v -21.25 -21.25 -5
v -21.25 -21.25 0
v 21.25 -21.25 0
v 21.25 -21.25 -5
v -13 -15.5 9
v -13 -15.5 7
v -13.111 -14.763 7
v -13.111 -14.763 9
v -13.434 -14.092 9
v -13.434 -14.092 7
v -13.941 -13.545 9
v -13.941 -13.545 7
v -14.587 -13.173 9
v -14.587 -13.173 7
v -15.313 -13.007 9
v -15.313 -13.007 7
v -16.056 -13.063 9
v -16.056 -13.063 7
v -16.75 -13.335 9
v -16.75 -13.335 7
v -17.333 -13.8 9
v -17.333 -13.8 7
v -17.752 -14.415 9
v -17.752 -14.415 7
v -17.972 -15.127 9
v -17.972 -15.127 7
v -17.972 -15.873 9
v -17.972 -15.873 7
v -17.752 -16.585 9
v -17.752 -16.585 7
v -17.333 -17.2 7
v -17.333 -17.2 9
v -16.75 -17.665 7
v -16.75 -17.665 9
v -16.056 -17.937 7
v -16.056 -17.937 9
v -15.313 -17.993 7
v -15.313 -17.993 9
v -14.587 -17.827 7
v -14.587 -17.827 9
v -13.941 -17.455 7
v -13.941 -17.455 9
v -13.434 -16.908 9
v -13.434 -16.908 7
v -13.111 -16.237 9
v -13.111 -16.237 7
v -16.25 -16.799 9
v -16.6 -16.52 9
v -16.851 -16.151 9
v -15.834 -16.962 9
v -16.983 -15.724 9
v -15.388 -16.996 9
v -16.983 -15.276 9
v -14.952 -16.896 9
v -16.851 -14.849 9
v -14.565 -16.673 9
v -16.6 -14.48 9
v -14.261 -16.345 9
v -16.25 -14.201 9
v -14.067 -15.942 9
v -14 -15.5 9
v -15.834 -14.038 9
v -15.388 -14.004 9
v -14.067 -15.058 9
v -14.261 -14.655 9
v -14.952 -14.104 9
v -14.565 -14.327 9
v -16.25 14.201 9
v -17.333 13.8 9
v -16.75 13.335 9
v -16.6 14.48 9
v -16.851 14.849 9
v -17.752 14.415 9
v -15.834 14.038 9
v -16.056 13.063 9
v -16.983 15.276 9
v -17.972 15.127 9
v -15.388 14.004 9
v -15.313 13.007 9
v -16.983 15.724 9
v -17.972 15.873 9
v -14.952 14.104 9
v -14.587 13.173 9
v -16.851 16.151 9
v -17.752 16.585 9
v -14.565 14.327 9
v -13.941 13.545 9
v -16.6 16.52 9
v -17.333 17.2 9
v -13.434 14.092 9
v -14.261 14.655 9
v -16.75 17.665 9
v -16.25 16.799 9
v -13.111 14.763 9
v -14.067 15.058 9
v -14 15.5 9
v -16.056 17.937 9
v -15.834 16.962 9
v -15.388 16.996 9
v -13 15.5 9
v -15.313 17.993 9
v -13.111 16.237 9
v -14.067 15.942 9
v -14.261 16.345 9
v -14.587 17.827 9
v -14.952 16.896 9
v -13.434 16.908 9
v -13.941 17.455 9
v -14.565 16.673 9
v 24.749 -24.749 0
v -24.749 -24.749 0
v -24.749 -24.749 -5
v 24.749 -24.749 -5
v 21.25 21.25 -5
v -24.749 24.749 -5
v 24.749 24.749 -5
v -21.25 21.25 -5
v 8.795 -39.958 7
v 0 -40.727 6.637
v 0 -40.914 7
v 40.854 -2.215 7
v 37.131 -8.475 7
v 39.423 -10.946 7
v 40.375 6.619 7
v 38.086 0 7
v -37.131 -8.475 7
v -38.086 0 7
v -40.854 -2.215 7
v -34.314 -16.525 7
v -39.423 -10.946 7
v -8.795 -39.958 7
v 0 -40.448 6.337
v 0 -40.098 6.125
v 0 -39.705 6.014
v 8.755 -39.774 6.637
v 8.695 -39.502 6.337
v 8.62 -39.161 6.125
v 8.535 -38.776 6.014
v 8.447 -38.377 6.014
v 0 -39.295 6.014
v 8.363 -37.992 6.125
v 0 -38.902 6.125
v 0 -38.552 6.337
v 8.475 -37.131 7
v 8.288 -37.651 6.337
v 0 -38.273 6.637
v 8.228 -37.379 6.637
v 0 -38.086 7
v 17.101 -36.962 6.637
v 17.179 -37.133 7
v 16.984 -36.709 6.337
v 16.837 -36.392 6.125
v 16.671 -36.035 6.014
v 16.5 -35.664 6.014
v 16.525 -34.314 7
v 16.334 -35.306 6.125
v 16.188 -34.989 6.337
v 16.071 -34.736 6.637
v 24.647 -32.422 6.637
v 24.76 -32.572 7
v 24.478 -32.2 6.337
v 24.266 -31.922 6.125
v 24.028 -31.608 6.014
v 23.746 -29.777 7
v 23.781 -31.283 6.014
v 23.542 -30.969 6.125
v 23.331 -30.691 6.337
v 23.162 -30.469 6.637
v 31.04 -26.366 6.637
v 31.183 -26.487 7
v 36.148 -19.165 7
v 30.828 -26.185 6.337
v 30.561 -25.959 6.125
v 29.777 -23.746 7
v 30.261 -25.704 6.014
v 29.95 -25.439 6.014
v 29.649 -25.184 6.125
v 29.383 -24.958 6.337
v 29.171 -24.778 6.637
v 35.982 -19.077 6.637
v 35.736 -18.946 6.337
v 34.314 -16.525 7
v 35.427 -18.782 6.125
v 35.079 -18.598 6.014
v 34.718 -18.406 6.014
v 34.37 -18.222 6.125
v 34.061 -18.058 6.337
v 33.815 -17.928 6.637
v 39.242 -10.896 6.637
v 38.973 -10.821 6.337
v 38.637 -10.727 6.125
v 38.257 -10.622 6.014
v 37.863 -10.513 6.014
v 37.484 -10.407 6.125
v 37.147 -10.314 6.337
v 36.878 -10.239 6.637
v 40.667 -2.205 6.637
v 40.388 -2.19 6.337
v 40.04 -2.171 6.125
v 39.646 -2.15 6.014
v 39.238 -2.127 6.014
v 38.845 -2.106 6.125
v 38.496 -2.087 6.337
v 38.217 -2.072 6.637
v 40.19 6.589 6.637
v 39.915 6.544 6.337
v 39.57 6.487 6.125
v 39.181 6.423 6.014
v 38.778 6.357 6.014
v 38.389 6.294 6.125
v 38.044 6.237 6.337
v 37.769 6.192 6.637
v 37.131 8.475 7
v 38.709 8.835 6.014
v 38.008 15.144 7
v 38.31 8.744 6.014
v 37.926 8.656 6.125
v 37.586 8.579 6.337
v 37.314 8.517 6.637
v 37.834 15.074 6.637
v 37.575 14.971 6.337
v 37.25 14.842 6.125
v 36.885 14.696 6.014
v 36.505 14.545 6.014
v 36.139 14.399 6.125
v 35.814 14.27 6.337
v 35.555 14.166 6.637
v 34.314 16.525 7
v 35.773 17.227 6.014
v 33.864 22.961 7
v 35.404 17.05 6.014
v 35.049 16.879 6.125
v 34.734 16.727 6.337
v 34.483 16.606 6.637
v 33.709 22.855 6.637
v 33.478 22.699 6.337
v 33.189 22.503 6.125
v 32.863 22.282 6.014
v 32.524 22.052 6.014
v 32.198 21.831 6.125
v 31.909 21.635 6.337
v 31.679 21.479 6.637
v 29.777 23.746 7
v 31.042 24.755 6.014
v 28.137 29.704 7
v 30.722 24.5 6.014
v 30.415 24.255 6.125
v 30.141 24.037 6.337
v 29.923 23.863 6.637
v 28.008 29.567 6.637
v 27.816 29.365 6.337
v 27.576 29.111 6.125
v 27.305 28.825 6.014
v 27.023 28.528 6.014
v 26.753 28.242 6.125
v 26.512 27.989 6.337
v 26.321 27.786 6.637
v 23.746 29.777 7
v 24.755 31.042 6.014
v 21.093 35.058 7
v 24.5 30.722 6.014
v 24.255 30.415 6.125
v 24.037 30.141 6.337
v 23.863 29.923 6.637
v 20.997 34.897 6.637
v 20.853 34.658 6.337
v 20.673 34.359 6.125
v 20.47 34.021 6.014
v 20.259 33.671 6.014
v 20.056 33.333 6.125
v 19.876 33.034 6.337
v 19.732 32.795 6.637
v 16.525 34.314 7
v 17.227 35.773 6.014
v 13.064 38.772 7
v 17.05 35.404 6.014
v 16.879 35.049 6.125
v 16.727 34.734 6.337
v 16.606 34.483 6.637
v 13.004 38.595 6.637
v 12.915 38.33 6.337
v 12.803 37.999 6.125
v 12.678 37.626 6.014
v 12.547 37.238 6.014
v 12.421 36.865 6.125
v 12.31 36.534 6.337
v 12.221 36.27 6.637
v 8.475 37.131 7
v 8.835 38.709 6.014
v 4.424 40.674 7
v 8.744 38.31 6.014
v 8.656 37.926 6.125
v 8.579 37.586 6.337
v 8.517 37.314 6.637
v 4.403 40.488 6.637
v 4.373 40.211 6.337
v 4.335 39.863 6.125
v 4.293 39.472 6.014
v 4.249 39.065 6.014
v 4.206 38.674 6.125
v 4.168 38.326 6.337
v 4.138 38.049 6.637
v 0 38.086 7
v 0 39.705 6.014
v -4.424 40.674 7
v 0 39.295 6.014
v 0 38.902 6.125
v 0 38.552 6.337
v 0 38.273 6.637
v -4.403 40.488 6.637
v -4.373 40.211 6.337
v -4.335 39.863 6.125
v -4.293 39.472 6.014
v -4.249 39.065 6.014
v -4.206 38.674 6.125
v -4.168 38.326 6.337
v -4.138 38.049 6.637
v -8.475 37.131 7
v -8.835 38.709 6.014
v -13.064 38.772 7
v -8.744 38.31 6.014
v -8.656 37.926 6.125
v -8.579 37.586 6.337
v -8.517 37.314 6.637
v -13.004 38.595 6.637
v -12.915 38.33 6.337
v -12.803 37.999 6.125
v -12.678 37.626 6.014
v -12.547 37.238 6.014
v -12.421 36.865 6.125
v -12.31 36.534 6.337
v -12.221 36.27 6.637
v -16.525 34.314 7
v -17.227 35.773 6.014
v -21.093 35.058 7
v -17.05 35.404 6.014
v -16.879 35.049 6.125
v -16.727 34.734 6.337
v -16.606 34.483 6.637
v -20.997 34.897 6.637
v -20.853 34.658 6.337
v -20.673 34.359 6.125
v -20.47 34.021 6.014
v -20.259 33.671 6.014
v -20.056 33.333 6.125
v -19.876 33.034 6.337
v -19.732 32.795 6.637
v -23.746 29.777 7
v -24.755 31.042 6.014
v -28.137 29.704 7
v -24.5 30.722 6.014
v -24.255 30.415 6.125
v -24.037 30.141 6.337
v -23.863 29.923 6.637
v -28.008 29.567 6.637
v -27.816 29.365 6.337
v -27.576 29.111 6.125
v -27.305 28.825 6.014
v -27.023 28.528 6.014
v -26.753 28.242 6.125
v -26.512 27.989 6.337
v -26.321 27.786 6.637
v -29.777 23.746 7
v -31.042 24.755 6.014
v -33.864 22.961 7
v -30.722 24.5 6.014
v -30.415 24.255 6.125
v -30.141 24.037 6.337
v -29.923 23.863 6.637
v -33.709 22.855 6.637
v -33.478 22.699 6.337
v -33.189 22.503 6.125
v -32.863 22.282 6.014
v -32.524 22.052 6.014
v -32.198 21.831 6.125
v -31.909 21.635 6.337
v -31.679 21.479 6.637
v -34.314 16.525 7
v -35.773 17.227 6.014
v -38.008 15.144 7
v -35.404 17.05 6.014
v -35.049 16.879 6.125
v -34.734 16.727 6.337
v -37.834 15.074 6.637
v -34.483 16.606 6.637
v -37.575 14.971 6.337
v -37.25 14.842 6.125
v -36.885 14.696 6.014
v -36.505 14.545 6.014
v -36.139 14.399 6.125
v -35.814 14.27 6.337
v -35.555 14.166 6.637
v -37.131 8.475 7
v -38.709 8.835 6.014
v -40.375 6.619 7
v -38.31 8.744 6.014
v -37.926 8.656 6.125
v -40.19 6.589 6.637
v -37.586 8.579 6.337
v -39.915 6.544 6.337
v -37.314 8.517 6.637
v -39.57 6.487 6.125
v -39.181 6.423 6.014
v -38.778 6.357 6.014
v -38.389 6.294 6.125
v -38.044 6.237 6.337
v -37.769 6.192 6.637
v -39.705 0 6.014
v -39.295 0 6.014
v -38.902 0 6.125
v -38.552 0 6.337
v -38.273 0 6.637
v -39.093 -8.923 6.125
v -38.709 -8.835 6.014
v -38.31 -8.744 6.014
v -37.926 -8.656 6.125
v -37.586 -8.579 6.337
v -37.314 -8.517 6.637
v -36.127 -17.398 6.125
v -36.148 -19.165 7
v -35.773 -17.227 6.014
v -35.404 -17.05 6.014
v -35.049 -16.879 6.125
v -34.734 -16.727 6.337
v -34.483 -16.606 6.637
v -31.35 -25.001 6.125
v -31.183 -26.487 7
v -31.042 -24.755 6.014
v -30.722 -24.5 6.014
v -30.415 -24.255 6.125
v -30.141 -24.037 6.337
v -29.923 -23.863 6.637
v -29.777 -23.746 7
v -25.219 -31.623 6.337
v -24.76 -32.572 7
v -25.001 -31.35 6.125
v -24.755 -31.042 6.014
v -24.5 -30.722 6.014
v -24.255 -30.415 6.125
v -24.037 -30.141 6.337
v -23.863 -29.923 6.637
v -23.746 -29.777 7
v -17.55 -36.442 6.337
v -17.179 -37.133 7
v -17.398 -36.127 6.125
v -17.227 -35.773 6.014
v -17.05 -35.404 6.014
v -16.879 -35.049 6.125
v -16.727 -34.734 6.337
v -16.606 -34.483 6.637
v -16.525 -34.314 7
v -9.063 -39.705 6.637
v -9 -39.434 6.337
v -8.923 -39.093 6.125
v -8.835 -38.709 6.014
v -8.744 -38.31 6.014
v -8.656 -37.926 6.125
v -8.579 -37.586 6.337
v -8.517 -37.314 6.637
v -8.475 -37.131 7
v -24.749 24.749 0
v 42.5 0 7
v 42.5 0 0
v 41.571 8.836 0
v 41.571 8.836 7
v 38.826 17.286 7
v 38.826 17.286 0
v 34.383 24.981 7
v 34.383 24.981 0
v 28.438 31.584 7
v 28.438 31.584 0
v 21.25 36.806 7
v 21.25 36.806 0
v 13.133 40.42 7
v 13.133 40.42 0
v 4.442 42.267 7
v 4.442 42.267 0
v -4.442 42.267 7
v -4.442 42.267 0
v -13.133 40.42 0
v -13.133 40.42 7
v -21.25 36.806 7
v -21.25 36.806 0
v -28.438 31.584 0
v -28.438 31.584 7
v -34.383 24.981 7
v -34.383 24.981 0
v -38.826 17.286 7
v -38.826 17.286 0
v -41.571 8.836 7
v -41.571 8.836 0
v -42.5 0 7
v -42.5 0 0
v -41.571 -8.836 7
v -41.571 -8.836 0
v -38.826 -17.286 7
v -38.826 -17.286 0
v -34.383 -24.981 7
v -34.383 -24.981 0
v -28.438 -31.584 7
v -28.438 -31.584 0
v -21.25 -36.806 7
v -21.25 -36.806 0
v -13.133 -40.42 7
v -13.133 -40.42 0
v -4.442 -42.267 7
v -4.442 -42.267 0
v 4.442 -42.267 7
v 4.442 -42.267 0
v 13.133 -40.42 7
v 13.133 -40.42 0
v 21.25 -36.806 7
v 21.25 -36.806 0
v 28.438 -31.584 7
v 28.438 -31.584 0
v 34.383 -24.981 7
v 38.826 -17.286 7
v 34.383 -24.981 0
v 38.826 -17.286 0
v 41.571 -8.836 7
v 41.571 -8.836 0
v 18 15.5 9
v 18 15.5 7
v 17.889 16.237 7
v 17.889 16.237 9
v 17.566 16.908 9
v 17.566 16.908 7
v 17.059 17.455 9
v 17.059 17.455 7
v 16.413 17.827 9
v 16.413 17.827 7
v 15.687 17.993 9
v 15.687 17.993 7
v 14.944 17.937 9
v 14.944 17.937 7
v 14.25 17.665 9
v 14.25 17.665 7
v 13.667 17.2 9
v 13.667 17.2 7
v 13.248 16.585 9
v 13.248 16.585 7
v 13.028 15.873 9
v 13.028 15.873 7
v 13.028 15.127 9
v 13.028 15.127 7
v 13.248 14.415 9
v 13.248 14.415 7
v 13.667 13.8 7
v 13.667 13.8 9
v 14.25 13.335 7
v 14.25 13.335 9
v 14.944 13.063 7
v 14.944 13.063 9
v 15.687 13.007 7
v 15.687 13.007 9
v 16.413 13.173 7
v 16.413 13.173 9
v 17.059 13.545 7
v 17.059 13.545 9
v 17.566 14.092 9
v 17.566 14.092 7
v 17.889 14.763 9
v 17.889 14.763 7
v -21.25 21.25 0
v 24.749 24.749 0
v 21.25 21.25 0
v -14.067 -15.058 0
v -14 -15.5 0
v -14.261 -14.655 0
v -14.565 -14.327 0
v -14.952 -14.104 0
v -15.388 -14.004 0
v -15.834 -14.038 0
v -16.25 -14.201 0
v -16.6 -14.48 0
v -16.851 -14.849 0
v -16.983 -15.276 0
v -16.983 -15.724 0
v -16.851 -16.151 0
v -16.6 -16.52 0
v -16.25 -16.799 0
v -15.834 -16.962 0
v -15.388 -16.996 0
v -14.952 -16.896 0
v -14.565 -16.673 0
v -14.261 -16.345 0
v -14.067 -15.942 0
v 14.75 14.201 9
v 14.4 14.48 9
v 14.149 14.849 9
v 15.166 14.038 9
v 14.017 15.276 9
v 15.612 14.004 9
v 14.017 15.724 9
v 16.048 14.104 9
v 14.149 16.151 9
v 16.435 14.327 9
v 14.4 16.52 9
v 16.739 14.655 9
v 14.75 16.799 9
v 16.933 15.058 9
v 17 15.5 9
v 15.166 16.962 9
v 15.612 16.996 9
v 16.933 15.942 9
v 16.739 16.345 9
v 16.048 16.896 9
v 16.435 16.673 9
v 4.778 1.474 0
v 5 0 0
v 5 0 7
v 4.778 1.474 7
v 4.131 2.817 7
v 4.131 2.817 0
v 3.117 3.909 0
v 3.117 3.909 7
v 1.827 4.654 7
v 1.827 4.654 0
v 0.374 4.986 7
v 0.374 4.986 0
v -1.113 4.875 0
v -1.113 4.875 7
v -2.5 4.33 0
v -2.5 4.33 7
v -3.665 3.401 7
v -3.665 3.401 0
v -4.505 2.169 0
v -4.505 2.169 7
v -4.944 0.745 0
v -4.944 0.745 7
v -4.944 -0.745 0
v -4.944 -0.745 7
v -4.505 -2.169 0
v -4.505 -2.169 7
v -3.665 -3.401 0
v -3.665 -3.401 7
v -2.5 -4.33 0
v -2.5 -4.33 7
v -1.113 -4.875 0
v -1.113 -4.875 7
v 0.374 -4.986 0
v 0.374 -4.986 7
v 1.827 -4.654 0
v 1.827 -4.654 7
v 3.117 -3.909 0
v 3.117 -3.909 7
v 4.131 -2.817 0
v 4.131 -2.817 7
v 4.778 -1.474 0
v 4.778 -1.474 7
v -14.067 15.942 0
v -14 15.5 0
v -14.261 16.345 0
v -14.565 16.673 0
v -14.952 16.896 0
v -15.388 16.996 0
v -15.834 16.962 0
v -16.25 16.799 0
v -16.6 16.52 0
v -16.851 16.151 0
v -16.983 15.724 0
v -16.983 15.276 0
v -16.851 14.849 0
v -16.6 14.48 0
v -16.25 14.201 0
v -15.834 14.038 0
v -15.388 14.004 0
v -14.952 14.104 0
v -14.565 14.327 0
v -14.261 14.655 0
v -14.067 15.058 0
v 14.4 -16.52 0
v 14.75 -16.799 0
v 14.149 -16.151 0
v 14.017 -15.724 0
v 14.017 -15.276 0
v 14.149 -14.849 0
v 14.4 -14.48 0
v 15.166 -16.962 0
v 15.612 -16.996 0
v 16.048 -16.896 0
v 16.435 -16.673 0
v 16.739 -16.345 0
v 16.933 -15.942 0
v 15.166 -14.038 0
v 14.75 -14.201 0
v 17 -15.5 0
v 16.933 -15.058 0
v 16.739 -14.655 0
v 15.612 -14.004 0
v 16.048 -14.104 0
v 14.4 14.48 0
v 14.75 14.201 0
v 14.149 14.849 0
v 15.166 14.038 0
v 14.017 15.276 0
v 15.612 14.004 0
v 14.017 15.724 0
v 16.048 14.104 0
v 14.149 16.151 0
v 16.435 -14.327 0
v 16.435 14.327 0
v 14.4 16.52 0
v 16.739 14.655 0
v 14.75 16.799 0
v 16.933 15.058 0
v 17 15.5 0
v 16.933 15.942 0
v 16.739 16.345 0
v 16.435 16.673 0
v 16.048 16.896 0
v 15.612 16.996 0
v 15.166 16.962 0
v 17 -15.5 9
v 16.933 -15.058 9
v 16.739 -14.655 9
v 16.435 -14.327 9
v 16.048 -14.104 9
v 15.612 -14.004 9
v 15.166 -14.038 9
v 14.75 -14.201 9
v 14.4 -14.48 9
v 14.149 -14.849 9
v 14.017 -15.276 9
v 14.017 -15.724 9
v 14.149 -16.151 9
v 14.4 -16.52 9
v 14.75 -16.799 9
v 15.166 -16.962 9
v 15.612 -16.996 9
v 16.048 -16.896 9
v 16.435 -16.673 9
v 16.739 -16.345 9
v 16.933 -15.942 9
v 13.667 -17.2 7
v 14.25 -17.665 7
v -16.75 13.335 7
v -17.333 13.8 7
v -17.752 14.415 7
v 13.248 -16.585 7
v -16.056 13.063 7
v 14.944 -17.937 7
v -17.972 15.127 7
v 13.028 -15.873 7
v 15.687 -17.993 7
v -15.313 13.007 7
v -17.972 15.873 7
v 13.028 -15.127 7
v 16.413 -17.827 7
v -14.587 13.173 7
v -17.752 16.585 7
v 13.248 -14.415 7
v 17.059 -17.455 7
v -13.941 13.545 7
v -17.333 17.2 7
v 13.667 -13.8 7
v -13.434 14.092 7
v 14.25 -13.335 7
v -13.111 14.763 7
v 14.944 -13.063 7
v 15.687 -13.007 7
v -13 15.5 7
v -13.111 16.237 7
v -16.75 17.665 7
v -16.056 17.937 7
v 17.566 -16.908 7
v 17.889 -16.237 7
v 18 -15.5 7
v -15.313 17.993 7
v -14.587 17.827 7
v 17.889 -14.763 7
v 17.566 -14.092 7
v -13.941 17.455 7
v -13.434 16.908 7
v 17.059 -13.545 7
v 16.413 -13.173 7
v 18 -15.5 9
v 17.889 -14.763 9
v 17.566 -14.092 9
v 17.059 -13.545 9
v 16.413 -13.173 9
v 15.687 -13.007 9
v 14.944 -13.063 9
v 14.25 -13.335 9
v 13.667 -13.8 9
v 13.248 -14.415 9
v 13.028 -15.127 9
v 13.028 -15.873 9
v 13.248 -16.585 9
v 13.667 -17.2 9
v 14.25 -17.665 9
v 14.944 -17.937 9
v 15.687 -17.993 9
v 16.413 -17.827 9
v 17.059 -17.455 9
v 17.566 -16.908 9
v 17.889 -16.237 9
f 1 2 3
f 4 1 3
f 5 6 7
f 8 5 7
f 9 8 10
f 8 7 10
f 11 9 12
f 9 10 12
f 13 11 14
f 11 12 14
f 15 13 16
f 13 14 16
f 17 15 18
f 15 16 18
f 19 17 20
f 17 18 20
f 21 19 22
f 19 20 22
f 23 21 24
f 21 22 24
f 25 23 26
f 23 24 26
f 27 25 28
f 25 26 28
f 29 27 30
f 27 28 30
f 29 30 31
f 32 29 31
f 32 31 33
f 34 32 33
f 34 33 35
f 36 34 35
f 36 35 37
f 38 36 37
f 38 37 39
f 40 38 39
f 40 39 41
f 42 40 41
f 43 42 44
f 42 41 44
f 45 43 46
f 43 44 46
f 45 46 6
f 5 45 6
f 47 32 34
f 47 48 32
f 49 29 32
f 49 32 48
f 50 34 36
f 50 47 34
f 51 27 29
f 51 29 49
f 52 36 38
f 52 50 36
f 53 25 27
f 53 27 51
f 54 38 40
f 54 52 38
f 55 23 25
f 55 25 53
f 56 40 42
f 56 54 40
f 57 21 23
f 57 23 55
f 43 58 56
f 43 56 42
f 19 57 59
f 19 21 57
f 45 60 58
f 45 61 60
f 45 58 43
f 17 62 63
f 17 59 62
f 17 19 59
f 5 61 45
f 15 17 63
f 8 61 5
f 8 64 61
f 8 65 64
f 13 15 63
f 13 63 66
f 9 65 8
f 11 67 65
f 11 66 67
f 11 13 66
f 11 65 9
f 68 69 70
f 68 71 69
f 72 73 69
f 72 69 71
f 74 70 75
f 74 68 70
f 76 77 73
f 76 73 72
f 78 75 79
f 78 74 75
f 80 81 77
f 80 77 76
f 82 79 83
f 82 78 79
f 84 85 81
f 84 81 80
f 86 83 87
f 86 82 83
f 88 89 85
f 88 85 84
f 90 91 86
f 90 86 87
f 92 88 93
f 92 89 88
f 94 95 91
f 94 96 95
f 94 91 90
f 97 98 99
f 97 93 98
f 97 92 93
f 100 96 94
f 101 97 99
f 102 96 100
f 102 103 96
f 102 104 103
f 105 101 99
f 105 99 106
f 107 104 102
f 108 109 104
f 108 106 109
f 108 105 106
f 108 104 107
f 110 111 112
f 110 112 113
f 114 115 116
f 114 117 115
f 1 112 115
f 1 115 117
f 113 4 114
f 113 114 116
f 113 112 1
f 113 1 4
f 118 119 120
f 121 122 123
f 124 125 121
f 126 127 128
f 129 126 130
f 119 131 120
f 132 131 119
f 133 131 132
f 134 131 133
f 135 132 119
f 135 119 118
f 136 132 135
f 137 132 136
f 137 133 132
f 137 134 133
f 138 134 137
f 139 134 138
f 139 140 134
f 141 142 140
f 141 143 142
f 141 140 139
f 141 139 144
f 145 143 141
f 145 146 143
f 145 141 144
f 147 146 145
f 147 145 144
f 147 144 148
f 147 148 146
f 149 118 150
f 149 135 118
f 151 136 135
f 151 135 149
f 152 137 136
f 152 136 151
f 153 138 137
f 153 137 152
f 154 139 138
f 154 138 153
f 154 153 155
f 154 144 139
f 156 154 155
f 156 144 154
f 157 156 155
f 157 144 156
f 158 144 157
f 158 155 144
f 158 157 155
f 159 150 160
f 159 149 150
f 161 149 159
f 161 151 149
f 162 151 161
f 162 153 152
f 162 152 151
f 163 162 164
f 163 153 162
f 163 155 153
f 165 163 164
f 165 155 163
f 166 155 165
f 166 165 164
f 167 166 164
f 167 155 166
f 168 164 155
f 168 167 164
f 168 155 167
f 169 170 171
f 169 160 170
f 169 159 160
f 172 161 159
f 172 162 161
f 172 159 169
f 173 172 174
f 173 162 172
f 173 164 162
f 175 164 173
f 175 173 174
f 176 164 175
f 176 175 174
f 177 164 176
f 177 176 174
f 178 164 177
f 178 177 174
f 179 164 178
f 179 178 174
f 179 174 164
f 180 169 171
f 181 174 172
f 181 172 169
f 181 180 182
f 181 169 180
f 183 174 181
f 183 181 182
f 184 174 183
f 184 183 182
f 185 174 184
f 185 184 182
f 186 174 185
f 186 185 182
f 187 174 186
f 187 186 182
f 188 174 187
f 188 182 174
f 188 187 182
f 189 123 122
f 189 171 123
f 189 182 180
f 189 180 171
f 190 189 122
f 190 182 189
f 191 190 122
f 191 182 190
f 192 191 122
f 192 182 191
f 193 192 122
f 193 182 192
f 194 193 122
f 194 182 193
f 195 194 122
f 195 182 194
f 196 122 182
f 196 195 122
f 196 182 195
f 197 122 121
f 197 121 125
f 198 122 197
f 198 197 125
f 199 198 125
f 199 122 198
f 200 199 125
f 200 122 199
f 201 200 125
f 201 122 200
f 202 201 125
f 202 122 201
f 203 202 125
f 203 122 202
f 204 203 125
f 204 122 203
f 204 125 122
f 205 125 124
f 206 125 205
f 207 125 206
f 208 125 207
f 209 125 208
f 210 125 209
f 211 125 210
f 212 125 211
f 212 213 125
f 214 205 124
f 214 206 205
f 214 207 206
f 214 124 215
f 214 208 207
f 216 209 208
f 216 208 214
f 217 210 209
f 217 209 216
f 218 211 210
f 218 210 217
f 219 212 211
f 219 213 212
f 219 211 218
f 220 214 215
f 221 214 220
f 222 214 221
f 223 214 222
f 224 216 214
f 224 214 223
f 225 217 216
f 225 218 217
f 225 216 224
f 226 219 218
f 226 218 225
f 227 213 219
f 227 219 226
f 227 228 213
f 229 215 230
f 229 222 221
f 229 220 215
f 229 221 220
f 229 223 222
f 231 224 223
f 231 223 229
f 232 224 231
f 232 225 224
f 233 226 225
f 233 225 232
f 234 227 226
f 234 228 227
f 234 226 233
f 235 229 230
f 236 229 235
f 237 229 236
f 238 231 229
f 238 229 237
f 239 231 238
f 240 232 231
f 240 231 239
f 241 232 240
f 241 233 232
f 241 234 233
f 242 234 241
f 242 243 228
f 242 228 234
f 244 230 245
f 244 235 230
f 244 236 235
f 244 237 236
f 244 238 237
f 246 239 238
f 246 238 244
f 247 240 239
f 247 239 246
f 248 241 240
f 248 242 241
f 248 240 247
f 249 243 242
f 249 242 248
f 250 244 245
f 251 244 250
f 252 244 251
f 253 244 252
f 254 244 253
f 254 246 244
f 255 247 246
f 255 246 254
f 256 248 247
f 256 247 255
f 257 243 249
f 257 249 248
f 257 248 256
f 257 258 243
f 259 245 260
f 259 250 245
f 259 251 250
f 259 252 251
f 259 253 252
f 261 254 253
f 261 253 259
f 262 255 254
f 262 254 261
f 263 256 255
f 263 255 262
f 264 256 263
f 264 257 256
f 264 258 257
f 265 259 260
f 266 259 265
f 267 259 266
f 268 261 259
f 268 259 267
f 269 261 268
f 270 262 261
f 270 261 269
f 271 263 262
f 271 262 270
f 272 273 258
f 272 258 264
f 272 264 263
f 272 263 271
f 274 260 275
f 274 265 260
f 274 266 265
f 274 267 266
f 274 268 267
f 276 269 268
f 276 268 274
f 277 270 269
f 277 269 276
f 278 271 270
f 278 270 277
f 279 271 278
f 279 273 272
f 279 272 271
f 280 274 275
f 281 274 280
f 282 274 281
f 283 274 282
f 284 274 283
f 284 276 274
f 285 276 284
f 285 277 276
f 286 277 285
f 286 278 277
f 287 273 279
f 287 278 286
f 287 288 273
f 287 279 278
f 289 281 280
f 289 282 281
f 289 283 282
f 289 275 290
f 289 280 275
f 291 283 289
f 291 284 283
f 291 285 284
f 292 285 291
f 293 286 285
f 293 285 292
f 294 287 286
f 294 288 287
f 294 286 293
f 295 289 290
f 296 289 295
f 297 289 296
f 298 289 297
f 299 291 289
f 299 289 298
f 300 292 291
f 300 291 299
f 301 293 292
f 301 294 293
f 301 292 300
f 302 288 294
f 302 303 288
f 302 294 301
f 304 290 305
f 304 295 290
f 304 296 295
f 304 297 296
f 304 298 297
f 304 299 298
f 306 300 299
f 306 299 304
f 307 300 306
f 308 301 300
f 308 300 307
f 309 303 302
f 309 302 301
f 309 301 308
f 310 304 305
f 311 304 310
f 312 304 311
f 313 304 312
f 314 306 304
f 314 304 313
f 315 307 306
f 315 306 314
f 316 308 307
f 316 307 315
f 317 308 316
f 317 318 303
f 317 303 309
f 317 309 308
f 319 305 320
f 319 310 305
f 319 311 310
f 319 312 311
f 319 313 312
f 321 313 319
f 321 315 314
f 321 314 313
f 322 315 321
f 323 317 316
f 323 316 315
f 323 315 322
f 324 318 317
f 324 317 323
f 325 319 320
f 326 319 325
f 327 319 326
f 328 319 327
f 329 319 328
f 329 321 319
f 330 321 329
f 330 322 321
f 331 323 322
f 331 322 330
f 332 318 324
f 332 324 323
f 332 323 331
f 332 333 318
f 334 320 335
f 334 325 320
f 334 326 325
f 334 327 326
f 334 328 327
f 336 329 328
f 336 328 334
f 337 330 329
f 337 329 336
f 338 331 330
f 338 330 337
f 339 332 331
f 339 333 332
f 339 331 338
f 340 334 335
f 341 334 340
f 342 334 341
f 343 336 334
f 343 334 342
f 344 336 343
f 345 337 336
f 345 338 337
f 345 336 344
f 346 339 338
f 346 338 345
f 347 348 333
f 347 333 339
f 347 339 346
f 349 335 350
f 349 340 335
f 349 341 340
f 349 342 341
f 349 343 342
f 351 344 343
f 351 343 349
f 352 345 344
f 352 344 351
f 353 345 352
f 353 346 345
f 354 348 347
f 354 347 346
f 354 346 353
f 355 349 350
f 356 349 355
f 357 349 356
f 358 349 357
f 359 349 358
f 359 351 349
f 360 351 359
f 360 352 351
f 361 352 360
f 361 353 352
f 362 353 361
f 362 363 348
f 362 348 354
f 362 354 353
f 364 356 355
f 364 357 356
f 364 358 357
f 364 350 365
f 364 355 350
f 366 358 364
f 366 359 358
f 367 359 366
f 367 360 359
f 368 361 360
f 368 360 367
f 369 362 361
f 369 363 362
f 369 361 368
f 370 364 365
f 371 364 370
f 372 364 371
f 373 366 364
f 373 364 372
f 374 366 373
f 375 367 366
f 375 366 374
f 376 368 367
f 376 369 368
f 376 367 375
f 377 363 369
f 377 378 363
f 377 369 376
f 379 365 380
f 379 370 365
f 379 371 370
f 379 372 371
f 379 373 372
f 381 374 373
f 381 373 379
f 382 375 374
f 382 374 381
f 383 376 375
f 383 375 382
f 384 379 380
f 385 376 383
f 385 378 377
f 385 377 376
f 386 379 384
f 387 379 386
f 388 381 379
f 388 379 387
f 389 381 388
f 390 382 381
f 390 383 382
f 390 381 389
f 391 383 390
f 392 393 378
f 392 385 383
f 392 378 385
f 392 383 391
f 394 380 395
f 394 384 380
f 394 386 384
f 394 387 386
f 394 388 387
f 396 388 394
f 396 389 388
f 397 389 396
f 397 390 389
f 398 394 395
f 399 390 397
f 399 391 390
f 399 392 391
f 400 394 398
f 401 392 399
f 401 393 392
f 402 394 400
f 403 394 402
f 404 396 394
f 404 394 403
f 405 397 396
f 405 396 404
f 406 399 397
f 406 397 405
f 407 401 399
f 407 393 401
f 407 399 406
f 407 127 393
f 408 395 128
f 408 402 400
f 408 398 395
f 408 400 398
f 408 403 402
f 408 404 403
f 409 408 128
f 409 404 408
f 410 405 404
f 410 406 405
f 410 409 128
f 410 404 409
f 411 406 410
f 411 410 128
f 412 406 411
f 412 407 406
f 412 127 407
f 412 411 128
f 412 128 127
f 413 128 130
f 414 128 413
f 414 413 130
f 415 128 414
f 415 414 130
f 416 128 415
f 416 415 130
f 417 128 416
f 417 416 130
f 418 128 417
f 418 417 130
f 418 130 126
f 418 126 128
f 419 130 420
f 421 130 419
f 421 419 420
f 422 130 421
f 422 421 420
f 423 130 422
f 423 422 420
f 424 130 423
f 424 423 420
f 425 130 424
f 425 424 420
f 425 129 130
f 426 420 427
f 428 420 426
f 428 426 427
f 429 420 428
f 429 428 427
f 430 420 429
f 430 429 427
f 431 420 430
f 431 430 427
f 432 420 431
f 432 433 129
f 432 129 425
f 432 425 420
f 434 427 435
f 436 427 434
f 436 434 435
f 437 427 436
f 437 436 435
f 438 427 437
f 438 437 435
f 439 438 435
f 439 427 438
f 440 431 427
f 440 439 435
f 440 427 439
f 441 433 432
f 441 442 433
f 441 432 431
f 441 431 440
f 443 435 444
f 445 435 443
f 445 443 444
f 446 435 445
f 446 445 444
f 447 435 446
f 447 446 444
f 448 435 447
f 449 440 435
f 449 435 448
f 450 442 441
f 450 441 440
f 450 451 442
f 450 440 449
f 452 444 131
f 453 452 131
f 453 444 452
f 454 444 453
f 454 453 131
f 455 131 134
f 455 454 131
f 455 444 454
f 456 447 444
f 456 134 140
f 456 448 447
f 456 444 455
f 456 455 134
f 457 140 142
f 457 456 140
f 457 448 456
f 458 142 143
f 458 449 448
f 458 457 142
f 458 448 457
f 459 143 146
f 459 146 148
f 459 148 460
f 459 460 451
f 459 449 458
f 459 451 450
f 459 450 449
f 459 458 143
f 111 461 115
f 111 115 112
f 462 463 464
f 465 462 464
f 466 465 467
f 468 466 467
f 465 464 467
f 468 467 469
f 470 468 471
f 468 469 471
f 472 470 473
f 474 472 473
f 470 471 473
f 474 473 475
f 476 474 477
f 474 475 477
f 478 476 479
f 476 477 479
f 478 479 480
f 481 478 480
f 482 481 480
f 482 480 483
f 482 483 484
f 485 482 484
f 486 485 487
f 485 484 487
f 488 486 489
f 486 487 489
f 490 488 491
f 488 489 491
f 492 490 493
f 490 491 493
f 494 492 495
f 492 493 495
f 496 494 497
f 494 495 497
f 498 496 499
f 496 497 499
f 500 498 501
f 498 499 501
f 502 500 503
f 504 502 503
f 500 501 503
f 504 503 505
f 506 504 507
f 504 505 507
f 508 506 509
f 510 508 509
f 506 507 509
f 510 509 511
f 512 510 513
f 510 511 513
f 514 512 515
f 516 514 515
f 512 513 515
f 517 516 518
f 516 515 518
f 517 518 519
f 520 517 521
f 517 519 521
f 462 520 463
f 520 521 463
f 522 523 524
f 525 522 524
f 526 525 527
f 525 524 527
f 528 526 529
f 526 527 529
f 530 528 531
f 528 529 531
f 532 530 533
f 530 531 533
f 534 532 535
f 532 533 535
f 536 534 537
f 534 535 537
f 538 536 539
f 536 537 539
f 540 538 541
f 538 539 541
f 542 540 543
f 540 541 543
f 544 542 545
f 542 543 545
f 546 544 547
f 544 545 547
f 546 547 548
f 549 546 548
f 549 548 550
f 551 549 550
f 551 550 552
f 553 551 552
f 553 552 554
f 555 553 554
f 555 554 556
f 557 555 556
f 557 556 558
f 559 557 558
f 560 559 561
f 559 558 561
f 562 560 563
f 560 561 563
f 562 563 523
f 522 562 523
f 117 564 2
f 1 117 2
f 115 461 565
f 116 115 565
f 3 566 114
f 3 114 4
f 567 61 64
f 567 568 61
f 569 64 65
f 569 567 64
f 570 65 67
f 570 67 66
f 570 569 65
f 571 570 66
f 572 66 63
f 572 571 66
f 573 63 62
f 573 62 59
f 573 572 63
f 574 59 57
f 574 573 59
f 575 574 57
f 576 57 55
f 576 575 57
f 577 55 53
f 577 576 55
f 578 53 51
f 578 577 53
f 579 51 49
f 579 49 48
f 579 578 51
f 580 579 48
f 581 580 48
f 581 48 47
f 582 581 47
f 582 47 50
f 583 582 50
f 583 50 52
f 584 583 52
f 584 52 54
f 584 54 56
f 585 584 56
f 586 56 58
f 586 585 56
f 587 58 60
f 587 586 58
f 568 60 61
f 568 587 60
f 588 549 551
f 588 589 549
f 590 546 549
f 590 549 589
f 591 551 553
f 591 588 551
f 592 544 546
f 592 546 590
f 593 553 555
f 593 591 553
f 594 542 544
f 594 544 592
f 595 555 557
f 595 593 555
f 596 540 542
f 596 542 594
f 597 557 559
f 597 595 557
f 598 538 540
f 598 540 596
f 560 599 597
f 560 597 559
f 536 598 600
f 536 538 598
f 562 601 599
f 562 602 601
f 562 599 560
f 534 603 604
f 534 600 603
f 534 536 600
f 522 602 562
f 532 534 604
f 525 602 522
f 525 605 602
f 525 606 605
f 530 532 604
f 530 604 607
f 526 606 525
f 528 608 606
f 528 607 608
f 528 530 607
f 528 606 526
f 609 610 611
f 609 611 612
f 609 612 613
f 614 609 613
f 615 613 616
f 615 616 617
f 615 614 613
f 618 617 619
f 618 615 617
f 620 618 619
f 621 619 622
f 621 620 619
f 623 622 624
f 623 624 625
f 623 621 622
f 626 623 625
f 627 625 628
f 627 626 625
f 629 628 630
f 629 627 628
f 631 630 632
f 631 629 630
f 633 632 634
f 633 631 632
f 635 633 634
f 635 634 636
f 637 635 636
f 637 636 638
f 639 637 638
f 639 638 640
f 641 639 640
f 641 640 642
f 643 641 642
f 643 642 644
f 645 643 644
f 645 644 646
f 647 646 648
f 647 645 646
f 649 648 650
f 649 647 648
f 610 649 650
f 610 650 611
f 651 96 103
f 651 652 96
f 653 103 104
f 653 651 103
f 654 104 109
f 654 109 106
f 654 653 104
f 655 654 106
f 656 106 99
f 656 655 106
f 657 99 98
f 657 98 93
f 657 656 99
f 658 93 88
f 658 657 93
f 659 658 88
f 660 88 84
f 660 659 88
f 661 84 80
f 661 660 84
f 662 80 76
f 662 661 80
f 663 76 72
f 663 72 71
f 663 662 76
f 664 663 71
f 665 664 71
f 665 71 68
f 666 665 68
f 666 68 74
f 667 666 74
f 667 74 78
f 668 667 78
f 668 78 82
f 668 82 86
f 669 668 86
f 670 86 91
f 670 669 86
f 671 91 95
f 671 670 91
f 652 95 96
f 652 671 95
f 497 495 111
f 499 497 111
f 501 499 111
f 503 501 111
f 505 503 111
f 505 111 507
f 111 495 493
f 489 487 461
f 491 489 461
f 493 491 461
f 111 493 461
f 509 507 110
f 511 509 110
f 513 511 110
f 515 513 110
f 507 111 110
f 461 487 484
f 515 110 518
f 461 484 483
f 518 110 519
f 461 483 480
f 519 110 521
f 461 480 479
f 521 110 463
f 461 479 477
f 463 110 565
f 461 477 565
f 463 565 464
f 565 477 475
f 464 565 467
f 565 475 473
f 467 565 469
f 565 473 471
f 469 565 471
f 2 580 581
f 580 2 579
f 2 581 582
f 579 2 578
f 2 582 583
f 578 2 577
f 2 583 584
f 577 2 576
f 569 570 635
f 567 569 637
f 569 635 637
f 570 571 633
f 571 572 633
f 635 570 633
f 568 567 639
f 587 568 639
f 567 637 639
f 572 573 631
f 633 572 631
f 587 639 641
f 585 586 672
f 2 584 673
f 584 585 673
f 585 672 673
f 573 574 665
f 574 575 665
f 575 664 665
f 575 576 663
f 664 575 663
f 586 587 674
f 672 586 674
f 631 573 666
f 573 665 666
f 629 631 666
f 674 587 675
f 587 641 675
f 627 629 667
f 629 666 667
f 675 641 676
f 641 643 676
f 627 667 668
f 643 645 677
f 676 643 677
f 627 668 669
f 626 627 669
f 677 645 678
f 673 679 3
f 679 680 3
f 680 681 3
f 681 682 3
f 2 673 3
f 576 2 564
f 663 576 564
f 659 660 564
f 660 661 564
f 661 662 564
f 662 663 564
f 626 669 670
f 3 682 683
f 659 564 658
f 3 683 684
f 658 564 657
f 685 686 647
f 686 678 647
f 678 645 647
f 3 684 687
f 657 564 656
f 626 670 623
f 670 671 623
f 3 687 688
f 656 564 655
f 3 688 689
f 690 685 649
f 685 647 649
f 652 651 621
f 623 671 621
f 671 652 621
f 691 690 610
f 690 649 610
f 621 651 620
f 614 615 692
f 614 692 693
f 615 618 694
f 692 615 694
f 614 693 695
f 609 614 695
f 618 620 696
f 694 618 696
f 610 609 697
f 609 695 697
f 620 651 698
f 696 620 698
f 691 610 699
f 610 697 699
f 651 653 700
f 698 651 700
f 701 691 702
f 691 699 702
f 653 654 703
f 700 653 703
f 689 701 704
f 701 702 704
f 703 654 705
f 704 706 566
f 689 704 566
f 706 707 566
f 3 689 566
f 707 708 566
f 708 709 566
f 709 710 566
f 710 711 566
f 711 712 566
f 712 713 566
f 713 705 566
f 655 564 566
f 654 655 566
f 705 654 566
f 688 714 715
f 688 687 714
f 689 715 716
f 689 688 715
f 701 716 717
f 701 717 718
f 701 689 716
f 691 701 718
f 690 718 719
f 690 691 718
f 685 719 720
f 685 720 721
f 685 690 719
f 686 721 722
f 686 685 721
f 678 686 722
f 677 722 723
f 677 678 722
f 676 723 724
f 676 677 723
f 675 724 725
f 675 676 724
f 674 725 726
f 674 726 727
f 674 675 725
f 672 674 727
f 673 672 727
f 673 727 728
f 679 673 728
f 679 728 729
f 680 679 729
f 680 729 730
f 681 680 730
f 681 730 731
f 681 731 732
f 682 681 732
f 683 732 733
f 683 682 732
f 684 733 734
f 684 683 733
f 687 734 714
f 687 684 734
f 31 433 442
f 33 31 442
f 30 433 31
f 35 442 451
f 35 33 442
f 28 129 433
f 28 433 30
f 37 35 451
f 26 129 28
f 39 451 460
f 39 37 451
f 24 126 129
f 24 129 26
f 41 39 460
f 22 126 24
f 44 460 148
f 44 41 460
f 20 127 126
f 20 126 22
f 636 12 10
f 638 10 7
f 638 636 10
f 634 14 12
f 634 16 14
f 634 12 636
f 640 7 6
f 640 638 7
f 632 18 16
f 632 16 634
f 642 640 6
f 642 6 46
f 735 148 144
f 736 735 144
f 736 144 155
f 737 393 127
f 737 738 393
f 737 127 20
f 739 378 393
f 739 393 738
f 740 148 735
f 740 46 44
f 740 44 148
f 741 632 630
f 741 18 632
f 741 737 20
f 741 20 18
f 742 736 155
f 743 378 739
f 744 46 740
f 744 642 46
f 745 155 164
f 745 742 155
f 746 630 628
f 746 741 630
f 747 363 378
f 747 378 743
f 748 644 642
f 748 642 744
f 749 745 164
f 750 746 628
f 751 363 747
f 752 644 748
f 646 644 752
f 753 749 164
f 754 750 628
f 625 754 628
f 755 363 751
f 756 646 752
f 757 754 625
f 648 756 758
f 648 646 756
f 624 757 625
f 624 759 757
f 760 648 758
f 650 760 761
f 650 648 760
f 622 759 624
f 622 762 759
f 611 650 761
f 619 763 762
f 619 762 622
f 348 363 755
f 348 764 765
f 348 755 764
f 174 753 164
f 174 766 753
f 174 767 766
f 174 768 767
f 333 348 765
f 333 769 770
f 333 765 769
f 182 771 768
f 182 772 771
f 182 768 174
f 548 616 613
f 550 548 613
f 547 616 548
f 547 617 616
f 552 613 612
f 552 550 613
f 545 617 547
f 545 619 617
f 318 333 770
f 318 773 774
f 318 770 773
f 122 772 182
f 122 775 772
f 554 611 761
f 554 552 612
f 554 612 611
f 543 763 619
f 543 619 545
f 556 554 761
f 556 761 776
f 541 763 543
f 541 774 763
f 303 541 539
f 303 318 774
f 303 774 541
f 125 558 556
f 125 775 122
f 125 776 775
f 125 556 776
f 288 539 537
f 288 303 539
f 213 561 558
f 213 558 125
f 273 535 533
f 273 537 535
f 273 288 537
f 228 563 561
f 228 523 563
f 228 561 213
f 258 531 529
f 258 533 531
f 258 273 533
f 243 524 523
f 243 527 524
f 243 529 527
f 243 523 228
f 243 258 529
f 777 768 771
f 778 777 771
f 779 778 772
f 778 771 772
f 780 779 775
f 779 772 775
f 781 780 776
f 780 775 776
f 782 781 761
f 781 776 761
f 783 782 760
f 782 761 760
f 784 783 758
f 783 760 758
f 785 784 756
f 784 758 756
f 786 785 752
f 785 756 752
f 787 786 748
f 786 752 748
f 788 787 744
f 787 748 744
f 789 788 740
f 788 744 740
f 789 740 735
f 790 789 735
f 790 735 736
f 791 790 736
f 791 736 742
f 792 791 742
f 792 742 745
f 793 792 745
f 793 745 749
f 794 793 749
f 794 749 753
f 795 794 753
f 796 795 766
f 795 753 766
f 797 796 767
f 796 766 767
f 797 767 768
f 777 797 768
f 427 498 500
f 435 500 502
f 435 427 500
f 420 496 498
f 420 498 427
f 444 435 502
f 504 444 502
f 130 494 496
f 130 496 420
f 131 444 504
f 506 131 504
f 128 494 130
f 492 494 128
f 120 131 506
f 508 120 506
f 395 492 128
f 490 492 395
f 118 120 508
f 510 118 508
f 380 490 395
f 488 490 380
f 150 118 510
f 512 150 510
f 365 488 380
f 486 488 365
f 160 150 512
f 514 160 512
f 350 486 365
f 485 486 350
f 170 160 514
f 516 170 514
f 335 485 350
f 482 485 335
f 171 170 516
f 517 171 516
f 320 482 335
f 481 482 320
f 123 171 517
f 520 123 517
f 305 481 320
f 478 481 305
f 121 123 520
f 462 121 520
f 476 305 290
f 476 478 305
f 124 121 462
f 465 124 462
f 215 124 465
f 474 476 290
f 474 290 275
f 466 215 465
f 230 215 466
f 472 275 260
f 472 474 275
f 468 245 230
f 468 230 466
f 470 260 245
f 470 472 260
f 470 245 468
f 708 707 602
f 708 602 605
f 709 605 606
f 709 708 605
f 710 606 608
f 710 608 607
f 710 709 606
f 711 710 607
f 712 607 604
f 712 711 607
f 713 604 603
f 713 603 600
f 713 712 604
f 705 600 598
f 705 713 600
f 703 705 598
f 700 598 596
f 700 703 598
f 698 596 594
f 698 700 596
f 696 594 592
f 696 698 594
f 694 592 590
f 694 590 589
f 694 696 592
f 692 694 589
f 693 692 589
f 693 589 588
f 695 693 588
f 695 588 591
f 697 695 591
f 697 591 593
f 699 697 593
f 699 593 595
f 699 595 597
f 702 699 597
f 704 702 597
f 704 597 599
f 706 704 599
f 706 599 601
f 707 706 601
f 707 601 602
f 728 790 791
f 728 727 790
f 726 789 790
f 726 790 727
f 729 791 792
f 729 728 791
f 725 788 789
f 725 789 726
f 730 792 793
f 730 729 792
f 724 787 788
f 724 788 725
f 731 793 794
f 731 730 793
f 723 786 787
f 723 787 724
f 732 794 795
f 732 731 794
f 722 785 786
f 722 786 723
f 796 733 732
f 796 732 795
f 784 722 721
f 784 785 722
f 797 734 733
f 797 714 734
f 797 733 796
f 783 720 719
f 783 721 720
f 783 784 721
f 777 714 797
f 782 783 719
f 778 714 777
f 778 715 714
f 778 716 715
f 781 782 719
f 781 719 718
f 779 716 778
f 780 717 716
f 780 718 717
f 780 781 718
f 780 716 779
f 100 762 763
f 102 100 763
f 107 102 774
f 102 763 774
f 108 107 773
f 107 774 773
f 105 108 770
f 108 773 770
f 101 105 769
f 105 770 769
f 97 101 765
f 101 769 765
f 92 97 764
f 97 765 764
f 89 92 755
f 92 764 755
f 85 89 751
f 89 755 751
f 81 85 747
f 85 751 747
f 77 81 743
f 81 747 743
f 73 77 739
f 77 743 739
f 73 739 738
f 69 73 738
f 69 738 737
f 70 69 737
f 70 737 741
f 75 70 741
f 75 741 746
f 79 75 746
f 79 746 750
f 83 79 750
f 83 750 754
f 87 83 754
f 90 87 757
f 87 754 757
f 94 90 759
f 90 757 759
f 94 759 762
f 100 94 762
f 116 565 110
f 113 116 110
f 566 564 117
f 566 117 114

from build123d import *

# Parameters (mm, degrees)
F0_R     = 42.5
F0_R_2   = 1.5
F0_R_3   = 5
F1_DEPTH = 7
F3_W     = 49.497474
F3_H     = 49.497474
F3_W_2   = 42.5
F3_H_2   = 42.5
F4_DEPTH = 5
F5_R     = 2.5
F5_R_2   = 1.5
F6_DEPTH = 2
F7_R     = 1.5


with BuildPart() as f1:
    # F0 (on Top) → F1 (new body)
    with BuildSketch(Plane.XY):
        Circle(F0_R)
        with Locations((-15.5, -15.5)):
            Circle(F0_R_2, mode=Mode.SUBTRACT)
        with Locations((15.5, -15.5)):
            Circle(F0_R_2, mode=Mode.SUBTRACT)
        with Locations((-15.5, 15.5)):
            Circle(F0_R_2, mode=Mode.SUBTRACT)
        Circle(F0_R_3, mode=Mode.SUBTRACT)
        with Locations((15.5, 15.5)):
            Circle(F0_R_2, mode=Mode.SUBTRACT)
    extrude(amount=F1_DEPTH)

    # F3 (on face) → F4 (join)
    with BuildSketch(Plane(origin=(0, 0, 0), x_dir=(1, 0, 0), z_dir=(0, 0, -1))):
        Rectangle(F3_W, F3_H)
        Rectangle(F3_W_2, F3_H_2, mode=Mode.SUBTRACT)
    extrude(amount=F4_DEPTH)

    # F5 (on offset) → F6 (join)
    with BuildSketch(Plane.XY.offset(7)):
        with Locations((-15.5, 15.5)):
            Circle(F5_R)
        with Locations((-15.5, 15.5)):
            Circle(F5_R_2, mode=Mode.SUBTRACT)
        with Locations((15.5, 15.5)):
            Circle(F5_R)
        with Locations((15.5, 15.5)):
            Circle(F5_R_2, mode=Mode.SUBTRACT)
        with Locations((15.5, -15.5)):
            Circle(F5_R)
        with Locations((15.5, -15.5)):
            Circle(F5_R_2, mode=Mode.SUBTRACT)
        with Locations((-15.5, -15.5)):
            Circle(F5_R)
        with Locations((-15.5, -15.5)):
            Circle(F5_R_2, mode=Mode.SUBTRACT)
    extrude(amount=F6_DEPTH)

    # F7 (on Right) → F8 (revolve, cut)
    with BuildSketch(Plane.YZ):
        with Locations((-39.5, 7.5)):
            Circle(F7_R)
    revolve(axis=Axis((0, 0, 7), (0, 0, 1)), mode=Mode.SUBTRACT)


solid = f1.part
